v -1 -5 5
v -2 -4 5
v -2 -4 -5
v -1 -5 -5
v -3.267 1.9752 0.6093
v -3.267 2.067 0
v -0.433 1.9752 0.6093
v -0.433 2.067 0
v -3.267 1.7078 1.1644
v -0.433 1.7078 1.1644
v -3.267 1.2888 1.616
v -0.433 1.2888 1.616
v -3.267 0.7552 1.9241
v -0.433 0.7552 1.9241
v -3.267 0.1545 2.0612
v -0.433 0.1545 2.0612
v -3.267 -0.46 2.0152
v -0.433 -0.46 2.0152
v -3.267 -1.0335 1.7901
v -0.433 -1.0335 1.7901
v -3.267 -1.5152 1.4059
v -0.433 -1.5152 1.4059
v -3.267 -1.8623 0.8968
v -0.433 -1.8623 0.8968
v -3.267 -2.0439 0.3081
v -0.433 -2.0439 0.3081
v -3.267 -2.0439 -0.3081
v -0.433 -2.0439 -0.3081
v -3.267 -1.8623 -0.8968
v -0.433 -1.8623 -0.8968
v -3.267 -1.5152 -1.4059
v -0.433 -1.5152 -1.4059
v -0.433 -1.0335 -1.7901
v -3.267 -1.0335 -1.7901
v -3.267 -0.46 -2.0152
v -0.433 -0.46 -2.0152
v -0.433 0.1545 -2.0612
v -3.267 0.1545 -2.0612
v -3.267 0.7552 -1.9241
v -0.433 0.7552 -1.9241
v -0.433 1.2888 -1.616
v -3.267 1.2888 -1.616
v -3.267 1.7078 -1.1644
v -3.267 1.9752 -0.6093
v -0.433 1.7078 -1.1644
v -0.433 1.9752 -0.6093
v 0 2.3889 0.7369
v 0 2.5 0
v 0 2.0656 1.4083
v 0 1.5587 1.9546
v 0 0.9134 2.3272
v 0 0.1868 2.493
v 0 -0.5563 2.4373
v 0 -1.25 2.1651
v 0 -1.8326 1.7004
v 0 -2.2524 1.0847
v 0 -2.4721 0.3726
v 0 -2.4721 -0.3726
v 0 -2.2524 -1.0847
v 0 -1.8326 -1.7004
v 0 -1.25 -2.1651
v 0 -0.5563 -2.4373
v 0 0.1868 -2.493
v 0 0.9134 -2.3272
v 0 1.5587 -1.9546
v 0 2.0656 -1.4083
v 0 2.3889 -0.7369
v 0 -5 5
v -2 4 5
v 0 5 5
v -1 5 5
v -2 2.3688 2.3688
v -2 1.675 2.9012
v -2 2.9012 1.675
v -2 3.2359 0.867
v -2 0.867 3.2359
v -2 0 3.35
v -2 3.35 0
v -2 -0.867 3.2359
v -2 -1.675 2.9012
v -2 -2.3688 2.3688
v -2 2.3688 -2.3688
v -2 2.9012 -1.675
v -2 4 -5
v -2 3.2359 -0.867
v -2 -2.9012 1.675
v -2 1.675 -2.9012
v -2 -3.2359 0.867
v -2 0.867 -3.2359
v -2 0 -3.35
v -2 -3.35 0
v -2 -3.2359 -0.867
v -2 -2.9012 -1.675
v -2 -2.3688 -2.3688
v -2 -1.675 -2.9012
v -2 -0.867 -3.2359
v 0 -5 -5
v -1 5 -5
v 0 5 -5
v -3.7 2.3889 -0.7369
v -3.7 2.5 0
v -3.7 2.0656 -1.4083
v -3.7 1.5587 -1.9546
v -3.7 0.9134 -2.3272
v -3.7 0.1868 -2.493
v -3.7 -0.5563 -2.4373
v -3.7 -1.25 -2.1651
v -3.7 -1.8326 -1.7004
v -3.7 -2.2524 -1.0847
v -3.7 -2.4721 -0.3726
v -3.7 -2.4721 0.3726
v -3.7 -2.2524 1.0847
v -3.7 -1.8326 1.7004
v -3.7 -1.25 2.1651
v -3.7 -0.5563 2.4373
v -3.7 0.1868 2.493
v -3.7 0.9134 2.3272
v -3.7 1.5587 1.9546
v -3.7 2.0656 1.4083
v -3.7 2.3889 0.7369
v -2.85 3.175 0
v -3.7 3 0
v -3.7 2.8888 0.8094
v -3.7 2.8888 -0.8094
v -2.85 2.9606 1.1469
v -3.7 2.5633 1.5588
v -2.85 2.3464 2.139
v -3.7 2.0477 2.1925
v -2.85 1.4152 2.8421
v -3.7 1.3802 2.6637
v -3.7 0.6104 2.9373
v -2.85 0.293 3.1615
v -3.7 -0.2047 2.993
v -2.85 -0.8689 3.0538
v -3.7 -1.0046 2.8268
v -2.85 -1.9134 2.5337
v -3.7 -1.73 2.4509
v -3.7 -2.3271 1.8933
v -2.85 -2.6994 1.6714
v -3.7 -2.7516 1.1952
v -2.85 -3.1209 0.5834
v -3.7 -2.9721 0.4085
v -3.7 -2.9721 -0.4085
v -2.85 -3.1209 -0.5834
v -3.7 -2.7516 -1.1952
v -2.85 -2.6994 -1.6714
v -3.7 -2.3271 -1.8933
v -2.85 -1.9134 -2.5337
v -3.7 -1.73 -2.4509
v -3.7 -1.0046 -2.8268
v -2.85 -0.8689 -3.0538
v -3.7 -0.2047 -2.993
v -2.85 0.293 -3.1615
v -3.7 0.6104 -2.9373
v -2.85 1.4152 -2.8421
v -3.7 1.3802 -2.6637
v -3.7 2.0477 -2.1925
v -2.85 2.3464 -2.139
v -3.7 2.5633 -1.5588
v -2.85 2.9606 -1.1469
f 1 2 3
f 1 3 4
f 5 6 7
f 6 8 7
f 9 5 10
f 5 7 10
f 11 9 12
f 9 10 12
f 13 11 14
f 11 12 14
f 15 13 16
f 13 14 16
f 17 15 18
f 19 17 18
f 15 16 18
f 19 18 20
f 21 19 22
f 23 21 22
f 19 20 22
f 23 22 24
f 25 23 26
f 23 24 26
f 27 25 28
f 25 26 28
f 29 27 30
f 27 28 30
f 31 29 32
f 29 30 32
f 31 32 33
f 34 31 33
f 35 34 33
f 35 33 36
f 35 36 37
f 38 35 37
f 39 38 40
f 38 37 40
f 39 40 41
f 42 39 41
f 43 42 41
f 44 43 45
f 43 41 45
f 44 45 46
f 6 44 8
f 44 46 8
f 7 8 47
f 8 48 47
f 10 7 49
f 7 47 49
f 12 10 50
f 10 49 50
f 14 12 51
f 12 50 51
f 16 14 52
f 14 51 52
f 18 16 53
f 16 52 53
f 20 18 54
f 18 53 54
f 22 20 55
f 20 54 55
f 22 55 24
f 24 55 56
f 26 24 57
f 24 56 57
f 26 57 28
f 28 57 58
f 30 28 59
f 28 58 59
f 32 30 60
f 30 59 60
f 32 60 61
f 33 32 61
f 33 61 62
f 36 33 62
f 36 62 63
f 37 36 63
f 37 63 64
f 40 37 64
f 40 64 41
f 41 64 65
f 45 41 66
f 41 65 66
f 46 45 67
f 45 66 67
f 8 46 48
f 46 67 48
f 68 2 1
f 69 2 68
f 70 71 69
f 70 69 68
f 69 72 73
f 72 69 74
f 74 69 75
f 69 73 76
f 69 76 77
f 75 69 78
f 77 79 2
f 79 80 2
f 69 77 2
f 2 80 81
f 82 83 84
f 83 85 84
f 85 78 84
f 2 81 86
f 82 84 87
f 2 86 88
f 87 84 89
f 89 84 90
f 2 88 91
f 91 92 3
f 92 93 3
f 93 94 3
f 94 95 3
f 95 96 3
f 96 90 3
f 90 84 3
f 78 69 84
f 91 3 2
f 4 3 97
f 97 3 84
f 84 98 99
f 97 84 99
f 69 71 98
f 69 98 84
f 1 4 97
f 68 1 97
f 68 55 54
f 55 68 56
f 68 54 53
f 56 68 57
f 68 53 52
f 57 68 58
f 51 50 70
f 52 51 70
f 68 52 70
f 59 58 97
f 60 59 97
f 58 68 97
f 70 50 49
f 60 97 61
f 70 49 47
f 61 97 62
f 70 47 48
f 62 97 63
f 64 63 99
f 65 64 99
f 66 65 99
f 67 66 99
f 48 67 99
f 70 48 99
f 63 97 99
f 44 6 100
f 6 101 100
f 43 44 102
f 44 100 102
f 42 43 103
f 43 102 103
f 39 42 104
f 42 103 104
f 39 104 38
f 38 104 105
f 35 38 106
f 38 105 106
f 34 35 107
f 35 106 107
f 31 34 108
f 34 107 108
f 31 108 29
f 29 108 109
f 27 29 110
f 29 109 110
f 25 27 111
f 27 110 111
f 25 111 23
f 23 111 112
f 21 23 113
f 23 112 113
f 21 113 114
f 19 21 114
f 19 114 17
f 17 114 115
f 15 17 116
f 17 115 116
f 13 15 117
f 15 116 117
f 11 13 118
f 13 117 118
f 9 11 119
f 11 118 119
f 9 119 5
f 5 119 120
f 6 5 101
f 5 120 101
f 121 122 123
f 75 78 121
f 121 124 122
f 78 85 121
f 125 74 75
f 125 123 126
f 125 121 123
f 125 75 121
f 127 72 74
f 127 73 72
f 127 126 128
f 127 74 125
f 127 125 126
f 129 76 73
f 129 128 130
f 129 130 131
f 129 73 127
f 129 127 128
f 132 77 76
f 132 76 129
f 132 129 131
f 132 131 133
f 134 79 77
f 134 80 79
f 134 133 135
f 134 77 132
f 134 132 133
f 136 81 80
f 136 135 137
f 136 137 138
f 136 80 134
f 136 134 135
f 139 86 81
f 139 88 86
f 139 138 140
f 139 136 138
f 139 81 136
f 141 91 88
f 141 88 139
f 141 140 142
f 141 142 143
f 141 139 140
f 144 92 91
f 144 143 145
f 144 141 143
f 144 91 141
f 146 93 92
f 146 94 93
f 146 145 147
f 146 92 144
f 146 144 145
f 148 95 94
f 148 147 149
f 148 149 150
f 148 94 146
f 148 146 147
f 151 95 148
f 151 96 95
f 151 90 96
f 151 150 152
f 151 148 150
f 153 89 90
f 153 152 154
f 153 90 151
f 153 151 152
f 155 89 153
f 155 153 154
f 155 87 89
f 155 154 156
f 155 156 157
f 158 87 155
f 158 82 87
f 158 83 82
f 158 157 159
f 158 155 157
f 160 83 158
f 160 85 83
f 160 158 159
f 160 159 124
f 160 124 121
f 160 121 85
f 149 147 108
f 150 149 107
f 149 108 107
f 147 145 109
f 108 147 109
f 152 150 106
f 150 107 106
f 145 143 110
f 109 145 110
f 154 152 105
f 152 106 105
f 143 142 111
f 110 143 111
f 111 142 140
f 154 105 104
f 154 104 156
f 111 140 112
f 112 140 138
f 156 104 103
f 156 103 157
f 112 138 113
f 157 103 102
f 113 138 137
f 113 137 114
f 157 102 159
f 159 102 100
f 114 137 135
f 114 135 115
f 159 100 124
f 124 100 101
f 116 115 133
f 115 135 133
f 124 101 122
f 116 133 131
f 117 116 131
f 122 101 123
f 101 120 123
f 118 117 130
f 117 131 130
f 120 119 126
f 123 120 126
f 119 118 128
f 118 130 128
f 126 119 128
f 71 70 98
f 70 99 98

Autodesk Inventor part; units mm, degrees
sketch "Sketch_1" plane through (0, 0, 0) normal (0, 0, 1) x (1, 0, 0)
  line L0 (-2, -4) -> (-1, -5)
  line L1 (-1, -5) -> (0, -5)
  line L2 (0, -5) -> (0, 5)
  line L3 (0, 5) -> (-1, 5)
  line L4 (-1, 5) -> (-2, 4)
  line L5 (-2, 4) -> (-2, -4)
extrude "Extrusion1" add sketch "Sketch_1" along normal mid plane 10
sketch "Sketch_10" plane through (0, 0, 0) normal (0, 0, 1) x (1, 0, 0)
  line L0 (-2, 0) -> (-3.7, 0)
  line L1 (-3.7, 0) -> (-3.7, 3)
  line L2 (-3.7, 3) -> (-2, 3.35)
  line L3 (-2, 3.35) -> (-2, 0)
  line L4 (-2, 0) -> (-3.7, 0)
revolve "Revolution1" add sketch "Sketch_10" angle 360 about axis through (-2, 0, 0) along (1, 0, 0)
sketch "Sketch_3" plane through (0, 0, 0) normal (0, 0, 1) x (1, 0, 0)
  line L0 (0, 0) -> (-3.7, 0)
  line L1 (-3.7, 0) -> (-3.7, 2.5)
  line L2 (-3.7, 2.5) -> (-3.267, 2.067)
  line L3 (-3.267, 2.067) -> (-0.433, 2.067)
  line L4 (-0.433, 2.067) -> (0, 2.5)
  line L5 (0, 2.5) -> (0, 0)
  line L6 (0, 0) -> (-3.7, 0)
revolve "Revolution2" cut sketch "Sketch_3" angle 360 about axis through (0, 0, 0) along (1, 0, 0)
thread "Thread1" size "M5x0.8" class "6H" standard "ISO Metric profile" full length
ref_plane "nut_XY" through (0, 0, 0) normal (1, 0, 0) x (0, 0, -1)
ref_plane "nut_YZ" through (0, 0, 0) normal (0, 0, -1) x (0, 1, 0)
ref_plane "nut_ZX" through (0, 0, 0) normal (0, 1, 0) x (1, 0, 0)
ref_plane "to_bolt_XY" through (-3.7, 0, 0) normal (1, 0, 0) x (0, 0, -1)
ref_plane "to_bolt_YZ" through (-3.7, 0, 0) normal (0, 0, -1) x (0, 1, 0)
ref_plane "to_bolt_ZX" through (-3.7, 0, 0) normal (0, 1, 0) x (1, 0, 0)
ref_plane "to_frames_XY" through (-2, 0, 0) normal (1, 0, 0) x (0, 0, -1)
ref_plane "to_frames_YZ" through (-2, 0, 0) normal (0, 0, -1) x (0, 1, 0)
ref_plane "to_frames_ZX" through (-2, 0, 0) normal (0, 1, 0) x (1, 0, 0)
properties part number "HNTTBS5-5"
